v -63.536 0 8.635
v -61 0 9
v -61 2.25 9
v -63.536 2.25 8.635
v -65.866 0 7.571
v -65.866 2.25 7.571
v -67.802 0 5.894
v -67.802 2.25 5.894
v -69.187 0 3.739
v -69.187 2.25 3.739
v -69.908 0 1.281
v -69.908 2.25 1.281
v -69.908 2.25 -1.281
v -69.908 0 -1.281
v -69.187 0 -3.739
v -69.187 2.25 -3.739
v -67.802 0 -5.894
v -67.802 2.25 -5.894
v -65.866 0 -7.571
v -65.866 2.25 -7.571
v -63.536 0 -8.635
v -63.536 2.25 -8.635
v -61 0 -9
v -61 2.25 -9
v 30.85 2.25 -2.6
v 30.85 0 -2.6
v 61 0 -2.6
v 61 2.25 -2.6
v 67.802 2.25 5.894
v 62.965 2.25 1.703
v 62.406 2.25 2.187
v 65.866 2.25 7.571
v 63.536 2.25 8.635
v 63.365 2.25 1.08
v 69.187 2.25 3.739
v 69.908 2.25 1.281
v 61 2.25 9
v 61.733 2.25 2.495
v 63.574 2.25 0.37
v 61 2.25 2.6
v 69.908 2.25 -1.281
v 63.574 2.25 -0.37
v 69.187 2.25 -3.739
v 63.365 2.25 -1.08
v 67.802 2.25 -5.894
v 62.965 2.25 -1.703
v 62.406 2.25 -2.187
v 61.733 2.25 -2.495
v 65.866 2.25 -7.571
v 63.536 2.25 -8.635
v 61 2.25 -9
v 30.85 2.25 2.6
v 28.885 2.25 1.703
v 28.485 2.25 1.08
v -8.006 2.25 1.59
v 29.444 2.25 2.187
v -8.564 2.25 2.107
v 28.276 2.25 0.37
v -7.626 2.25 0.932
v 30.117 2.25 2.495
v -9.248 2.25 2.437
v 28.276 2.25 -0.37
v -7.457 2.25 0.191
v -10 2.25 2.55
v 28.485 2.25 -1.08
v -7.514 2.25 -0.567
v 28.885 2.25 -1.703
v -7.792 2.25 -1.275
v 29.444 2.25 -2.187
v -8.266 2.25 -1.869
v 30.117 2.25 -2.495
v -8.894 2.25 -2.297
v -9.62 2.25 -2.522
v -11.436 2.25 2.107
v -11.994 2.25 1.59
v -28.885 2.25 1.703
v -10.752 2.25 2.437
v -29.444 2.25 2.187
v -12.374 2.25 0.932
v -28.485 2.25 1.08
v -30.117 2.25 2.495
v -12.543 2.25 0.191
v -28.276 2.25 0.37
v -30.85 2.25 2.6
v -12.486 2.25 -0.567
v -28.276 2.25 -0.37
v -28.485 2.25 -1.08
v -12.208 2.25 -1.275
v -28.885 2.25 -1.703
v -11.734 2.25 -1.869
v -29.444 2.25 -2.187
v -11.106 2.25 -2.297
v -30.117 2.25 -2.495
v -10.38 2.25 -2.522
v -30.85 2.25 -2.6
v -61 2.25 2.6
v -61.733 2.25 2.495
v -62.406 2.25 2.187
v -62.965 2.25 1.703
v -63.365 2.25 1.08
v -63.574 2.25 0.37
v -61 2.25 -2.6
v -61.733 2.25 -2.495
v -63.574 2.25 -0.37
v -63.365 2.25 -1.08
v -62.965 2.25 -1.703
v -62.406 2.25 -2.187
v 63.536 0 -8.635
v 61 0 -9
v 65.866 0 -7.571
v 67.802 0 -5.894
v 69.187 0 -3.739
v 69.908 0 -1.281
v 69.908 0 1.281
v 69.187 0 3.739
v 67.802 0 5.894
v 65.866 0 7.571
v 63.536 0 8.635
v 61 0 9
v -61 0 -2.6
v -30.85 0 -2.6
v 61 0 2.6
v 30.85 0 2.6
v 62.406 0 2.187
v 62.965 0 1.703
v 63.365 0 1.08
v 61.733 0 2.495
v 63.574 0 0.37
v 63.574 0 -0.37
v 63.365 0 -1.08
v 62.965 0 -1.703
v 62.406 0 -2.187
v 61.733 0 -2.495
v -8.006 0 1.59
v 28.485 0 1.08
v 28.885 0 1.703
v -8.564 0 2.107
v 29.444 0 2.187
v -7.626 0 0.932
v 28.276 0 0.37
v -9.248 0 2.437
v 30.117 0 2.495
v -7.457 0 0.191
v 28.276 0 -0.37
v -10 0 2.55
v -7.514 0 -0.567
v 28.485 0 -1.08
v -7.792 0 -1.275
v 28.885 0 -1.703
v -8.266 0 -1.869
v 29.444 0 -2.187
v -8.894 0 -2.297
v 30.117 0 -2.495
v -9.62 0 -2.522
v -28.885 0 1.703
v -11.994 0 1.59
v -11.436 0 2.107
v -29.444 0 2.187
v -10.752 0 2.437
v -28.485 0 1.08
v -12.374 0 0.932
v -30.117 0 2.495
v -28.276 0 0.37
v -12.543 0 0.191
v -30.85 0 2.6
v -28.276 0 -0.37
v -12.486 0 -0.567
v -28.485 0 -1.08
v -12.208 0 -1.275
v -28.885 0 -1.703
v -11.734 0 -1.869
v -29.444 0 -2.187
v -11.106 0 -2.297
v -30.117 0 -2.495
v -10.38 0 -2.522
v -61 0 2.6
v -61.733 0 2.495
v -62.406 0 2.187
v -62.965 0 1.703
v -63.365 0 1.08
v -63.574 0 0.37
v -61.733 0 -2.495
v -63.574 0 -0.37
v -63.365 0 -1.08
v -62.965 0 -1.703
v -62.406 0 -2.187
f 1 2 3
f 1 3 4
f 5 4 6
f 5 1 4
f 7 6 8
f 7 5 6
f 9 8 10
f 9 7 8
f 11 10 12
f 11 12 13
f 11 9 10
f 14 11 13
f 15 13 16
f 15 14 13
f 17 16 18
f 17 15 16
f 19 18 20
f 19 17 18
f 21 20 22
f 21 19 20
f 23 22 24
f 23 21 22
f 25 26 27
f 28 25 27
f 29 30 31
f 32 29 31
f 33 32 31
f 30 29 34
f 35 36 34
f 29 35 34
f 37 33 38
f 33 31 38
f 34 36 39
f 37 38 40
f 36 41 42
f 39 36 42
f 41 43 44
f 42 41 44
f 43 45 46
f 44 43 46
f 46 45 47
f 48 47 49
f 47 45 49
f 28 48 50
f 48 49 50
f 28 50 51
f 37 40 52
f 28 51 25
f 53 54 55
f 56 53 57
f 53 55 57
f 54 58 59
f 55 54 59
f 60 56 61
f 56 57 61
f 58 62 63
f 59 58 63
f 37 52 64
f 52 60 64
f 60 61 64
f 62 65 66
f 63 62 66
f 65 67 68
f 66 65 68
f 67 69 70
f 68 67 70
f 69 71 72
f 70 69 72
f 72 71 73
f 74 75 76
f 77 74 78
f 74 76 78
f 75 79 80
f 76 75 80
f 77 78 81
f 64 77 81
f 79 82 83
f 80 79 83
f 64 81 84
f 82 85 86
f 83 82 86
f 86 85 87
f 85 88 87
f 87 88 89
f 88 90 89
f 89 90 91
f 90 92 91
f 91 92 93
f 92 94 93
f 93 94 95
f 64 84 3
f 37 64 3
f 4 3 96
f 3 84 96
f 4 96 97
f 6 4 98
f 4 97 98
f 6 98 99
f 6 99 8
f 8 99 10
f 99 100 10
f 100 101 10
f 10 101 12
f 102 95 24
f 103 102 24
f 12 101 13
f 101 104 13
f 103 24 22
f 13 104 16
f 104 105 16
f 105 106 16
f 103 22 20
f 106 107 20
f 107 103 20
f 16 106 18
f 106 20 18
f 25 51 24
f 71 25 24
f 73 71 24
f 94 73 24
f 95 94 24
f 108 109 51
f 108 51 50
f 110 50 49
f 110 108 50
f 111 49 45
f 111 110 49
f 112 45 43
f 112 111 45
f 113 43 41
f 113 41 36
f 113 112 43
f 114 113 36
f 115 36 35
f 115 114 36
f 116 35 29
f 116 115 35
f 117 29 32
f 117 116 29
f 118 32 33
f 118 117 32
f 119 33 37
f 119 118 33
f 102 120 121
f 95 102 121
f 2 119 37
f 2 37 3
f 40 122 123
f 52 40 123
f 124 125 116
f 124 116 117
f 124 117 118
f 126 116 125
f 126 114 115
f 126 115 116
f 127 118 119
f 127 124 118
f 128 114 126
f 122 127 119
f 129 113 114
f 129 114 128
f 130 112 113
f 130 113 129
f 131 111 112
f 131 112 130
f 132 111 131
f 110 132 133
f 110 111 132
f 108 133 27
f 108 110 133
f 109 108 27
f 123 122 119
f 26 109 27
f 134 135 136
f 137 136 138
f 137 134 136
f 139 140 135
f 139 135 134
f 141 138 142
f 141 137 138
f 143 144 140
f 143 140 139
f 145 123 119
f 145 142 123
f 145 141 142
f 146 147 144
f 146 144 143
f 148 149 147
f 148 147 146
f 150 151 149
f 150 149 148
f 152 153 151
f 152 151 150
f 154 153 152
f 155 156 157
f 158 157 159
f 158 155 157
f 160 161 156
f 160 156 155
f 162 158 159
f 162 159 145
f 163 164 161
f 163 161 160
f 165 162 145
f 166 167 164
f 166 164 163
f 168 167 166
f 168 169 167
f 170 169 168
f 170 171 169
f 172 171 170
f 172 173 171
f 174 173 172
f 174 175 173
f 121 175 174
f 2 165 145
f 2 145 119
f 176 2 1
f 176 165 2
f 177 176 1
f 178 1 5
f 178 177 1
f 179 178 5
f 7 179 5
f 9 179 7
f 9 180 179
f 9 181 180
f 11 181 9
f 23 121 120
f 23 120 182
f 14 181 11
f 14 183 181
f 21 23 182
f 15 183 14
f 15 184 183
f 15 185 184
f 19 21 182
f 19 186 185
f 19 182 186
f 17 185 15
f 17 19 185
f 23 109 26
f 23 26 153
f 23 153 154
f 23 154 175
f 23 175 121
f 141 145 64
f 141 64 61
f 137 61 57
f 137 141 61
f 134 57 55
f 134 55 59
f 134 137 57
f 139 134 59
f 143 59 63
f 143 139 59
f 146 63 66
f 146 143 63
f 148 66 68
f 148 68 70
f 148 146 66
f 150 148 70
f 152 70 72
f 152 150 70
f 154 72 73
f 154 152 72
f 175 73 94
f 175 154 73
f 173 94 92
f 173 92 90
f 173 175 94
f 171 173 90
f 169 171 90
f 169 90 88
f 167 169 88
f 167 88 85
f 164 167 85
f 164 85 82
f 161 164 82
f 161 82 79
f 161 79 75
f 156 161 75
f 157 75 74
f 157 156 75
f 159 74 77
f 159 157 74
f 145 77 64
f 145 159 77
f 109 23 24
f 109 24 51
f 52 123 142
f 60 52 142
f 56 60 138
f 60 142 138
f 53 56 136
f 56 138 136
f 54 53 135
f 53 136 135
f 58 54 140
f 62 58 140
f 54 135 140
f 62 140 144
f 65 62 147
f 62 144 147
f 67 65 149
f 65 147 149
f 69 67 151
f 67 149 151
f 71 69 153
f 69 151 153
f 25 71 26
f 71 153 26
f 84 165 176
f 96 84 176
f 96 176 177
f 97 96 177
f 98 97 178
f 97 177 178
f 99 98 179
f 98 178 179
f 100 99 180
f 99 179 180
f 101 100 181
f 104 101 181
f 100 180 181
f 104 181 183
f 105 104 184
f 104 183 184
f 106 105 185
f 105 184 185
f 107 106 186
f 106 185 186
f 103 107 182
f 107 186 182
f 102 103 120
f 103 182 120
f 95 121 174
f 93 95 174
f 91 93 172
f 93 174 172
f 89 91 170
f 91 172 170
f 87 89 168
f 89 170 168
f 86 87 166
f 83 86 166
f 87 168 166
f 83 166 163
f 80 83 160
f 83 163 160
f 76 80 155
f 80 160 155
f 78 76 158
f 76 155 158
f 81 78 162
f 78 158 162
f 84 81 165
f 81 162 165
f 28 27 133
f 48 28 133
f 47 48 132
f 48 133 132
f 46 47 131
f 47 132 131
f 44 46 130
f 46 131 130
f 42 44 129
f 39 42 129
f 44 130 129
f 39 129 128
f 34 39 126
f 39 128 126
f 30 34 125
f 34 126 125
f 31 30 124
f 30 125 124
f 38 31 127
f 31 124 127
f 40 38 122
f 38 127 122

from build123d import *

# Parameters (mm, degrees)
SKETCH1_R           = 2.55
BOSS_EXTRUDE1_DEPTH = 2.25


with BuildPart() as part:
    # Sketch1 → Boss-Extrude1 (new body)
    with BuildSketch(Plane(origin=(0, 0, 0), x_dir=(1, 0, 0), z_dir=(0, 1, 0))):
        with BuildLine():
            Line((-61, 9), (61, 9))
            ThreePointArc((61, 9), (70, 0), (61, -9))
            Line((61, -9), (-61, -9))
            ThreePointArc((-61, -9), (-70, 0), (-61, 9))
        make_face()
        with Locations(Location((-10, 0, 0), (0, 0, 270))):
            Circle(SKETCH1_R, mode=Mode.SUBTRACT)
        with BuildLine():
            Line((-61, 2.6), (-30.85, 2.6))
            ThreePointArc((-30.85, 2.6), (-28.25, 0), (-30.85, -2.6))
            Line((-30.85, -2.6), (-61, -2.6))
            ThreePointArc((-61, -2.6), (-63.6, 0), (-61, 2.6))
        make_face(mode=Mode.SUBTRACT)
        with BuildLine():
            Line((61, -2.6), (30.85, -2.6))
            ThreePointArc((30.85, -2.6), (28.25, 0), (30.85, 2.6))
            Line((30.85, 2.6), (61, 2.6))
            ThreePointArc((61, 2.6), (63.6, 0), (61, -2.6))
        make_face(mode=Mode.SUBTRACT)
    extrude(amount=BOSS_EXTRUDE1_DEPTH)


solid = part.part
